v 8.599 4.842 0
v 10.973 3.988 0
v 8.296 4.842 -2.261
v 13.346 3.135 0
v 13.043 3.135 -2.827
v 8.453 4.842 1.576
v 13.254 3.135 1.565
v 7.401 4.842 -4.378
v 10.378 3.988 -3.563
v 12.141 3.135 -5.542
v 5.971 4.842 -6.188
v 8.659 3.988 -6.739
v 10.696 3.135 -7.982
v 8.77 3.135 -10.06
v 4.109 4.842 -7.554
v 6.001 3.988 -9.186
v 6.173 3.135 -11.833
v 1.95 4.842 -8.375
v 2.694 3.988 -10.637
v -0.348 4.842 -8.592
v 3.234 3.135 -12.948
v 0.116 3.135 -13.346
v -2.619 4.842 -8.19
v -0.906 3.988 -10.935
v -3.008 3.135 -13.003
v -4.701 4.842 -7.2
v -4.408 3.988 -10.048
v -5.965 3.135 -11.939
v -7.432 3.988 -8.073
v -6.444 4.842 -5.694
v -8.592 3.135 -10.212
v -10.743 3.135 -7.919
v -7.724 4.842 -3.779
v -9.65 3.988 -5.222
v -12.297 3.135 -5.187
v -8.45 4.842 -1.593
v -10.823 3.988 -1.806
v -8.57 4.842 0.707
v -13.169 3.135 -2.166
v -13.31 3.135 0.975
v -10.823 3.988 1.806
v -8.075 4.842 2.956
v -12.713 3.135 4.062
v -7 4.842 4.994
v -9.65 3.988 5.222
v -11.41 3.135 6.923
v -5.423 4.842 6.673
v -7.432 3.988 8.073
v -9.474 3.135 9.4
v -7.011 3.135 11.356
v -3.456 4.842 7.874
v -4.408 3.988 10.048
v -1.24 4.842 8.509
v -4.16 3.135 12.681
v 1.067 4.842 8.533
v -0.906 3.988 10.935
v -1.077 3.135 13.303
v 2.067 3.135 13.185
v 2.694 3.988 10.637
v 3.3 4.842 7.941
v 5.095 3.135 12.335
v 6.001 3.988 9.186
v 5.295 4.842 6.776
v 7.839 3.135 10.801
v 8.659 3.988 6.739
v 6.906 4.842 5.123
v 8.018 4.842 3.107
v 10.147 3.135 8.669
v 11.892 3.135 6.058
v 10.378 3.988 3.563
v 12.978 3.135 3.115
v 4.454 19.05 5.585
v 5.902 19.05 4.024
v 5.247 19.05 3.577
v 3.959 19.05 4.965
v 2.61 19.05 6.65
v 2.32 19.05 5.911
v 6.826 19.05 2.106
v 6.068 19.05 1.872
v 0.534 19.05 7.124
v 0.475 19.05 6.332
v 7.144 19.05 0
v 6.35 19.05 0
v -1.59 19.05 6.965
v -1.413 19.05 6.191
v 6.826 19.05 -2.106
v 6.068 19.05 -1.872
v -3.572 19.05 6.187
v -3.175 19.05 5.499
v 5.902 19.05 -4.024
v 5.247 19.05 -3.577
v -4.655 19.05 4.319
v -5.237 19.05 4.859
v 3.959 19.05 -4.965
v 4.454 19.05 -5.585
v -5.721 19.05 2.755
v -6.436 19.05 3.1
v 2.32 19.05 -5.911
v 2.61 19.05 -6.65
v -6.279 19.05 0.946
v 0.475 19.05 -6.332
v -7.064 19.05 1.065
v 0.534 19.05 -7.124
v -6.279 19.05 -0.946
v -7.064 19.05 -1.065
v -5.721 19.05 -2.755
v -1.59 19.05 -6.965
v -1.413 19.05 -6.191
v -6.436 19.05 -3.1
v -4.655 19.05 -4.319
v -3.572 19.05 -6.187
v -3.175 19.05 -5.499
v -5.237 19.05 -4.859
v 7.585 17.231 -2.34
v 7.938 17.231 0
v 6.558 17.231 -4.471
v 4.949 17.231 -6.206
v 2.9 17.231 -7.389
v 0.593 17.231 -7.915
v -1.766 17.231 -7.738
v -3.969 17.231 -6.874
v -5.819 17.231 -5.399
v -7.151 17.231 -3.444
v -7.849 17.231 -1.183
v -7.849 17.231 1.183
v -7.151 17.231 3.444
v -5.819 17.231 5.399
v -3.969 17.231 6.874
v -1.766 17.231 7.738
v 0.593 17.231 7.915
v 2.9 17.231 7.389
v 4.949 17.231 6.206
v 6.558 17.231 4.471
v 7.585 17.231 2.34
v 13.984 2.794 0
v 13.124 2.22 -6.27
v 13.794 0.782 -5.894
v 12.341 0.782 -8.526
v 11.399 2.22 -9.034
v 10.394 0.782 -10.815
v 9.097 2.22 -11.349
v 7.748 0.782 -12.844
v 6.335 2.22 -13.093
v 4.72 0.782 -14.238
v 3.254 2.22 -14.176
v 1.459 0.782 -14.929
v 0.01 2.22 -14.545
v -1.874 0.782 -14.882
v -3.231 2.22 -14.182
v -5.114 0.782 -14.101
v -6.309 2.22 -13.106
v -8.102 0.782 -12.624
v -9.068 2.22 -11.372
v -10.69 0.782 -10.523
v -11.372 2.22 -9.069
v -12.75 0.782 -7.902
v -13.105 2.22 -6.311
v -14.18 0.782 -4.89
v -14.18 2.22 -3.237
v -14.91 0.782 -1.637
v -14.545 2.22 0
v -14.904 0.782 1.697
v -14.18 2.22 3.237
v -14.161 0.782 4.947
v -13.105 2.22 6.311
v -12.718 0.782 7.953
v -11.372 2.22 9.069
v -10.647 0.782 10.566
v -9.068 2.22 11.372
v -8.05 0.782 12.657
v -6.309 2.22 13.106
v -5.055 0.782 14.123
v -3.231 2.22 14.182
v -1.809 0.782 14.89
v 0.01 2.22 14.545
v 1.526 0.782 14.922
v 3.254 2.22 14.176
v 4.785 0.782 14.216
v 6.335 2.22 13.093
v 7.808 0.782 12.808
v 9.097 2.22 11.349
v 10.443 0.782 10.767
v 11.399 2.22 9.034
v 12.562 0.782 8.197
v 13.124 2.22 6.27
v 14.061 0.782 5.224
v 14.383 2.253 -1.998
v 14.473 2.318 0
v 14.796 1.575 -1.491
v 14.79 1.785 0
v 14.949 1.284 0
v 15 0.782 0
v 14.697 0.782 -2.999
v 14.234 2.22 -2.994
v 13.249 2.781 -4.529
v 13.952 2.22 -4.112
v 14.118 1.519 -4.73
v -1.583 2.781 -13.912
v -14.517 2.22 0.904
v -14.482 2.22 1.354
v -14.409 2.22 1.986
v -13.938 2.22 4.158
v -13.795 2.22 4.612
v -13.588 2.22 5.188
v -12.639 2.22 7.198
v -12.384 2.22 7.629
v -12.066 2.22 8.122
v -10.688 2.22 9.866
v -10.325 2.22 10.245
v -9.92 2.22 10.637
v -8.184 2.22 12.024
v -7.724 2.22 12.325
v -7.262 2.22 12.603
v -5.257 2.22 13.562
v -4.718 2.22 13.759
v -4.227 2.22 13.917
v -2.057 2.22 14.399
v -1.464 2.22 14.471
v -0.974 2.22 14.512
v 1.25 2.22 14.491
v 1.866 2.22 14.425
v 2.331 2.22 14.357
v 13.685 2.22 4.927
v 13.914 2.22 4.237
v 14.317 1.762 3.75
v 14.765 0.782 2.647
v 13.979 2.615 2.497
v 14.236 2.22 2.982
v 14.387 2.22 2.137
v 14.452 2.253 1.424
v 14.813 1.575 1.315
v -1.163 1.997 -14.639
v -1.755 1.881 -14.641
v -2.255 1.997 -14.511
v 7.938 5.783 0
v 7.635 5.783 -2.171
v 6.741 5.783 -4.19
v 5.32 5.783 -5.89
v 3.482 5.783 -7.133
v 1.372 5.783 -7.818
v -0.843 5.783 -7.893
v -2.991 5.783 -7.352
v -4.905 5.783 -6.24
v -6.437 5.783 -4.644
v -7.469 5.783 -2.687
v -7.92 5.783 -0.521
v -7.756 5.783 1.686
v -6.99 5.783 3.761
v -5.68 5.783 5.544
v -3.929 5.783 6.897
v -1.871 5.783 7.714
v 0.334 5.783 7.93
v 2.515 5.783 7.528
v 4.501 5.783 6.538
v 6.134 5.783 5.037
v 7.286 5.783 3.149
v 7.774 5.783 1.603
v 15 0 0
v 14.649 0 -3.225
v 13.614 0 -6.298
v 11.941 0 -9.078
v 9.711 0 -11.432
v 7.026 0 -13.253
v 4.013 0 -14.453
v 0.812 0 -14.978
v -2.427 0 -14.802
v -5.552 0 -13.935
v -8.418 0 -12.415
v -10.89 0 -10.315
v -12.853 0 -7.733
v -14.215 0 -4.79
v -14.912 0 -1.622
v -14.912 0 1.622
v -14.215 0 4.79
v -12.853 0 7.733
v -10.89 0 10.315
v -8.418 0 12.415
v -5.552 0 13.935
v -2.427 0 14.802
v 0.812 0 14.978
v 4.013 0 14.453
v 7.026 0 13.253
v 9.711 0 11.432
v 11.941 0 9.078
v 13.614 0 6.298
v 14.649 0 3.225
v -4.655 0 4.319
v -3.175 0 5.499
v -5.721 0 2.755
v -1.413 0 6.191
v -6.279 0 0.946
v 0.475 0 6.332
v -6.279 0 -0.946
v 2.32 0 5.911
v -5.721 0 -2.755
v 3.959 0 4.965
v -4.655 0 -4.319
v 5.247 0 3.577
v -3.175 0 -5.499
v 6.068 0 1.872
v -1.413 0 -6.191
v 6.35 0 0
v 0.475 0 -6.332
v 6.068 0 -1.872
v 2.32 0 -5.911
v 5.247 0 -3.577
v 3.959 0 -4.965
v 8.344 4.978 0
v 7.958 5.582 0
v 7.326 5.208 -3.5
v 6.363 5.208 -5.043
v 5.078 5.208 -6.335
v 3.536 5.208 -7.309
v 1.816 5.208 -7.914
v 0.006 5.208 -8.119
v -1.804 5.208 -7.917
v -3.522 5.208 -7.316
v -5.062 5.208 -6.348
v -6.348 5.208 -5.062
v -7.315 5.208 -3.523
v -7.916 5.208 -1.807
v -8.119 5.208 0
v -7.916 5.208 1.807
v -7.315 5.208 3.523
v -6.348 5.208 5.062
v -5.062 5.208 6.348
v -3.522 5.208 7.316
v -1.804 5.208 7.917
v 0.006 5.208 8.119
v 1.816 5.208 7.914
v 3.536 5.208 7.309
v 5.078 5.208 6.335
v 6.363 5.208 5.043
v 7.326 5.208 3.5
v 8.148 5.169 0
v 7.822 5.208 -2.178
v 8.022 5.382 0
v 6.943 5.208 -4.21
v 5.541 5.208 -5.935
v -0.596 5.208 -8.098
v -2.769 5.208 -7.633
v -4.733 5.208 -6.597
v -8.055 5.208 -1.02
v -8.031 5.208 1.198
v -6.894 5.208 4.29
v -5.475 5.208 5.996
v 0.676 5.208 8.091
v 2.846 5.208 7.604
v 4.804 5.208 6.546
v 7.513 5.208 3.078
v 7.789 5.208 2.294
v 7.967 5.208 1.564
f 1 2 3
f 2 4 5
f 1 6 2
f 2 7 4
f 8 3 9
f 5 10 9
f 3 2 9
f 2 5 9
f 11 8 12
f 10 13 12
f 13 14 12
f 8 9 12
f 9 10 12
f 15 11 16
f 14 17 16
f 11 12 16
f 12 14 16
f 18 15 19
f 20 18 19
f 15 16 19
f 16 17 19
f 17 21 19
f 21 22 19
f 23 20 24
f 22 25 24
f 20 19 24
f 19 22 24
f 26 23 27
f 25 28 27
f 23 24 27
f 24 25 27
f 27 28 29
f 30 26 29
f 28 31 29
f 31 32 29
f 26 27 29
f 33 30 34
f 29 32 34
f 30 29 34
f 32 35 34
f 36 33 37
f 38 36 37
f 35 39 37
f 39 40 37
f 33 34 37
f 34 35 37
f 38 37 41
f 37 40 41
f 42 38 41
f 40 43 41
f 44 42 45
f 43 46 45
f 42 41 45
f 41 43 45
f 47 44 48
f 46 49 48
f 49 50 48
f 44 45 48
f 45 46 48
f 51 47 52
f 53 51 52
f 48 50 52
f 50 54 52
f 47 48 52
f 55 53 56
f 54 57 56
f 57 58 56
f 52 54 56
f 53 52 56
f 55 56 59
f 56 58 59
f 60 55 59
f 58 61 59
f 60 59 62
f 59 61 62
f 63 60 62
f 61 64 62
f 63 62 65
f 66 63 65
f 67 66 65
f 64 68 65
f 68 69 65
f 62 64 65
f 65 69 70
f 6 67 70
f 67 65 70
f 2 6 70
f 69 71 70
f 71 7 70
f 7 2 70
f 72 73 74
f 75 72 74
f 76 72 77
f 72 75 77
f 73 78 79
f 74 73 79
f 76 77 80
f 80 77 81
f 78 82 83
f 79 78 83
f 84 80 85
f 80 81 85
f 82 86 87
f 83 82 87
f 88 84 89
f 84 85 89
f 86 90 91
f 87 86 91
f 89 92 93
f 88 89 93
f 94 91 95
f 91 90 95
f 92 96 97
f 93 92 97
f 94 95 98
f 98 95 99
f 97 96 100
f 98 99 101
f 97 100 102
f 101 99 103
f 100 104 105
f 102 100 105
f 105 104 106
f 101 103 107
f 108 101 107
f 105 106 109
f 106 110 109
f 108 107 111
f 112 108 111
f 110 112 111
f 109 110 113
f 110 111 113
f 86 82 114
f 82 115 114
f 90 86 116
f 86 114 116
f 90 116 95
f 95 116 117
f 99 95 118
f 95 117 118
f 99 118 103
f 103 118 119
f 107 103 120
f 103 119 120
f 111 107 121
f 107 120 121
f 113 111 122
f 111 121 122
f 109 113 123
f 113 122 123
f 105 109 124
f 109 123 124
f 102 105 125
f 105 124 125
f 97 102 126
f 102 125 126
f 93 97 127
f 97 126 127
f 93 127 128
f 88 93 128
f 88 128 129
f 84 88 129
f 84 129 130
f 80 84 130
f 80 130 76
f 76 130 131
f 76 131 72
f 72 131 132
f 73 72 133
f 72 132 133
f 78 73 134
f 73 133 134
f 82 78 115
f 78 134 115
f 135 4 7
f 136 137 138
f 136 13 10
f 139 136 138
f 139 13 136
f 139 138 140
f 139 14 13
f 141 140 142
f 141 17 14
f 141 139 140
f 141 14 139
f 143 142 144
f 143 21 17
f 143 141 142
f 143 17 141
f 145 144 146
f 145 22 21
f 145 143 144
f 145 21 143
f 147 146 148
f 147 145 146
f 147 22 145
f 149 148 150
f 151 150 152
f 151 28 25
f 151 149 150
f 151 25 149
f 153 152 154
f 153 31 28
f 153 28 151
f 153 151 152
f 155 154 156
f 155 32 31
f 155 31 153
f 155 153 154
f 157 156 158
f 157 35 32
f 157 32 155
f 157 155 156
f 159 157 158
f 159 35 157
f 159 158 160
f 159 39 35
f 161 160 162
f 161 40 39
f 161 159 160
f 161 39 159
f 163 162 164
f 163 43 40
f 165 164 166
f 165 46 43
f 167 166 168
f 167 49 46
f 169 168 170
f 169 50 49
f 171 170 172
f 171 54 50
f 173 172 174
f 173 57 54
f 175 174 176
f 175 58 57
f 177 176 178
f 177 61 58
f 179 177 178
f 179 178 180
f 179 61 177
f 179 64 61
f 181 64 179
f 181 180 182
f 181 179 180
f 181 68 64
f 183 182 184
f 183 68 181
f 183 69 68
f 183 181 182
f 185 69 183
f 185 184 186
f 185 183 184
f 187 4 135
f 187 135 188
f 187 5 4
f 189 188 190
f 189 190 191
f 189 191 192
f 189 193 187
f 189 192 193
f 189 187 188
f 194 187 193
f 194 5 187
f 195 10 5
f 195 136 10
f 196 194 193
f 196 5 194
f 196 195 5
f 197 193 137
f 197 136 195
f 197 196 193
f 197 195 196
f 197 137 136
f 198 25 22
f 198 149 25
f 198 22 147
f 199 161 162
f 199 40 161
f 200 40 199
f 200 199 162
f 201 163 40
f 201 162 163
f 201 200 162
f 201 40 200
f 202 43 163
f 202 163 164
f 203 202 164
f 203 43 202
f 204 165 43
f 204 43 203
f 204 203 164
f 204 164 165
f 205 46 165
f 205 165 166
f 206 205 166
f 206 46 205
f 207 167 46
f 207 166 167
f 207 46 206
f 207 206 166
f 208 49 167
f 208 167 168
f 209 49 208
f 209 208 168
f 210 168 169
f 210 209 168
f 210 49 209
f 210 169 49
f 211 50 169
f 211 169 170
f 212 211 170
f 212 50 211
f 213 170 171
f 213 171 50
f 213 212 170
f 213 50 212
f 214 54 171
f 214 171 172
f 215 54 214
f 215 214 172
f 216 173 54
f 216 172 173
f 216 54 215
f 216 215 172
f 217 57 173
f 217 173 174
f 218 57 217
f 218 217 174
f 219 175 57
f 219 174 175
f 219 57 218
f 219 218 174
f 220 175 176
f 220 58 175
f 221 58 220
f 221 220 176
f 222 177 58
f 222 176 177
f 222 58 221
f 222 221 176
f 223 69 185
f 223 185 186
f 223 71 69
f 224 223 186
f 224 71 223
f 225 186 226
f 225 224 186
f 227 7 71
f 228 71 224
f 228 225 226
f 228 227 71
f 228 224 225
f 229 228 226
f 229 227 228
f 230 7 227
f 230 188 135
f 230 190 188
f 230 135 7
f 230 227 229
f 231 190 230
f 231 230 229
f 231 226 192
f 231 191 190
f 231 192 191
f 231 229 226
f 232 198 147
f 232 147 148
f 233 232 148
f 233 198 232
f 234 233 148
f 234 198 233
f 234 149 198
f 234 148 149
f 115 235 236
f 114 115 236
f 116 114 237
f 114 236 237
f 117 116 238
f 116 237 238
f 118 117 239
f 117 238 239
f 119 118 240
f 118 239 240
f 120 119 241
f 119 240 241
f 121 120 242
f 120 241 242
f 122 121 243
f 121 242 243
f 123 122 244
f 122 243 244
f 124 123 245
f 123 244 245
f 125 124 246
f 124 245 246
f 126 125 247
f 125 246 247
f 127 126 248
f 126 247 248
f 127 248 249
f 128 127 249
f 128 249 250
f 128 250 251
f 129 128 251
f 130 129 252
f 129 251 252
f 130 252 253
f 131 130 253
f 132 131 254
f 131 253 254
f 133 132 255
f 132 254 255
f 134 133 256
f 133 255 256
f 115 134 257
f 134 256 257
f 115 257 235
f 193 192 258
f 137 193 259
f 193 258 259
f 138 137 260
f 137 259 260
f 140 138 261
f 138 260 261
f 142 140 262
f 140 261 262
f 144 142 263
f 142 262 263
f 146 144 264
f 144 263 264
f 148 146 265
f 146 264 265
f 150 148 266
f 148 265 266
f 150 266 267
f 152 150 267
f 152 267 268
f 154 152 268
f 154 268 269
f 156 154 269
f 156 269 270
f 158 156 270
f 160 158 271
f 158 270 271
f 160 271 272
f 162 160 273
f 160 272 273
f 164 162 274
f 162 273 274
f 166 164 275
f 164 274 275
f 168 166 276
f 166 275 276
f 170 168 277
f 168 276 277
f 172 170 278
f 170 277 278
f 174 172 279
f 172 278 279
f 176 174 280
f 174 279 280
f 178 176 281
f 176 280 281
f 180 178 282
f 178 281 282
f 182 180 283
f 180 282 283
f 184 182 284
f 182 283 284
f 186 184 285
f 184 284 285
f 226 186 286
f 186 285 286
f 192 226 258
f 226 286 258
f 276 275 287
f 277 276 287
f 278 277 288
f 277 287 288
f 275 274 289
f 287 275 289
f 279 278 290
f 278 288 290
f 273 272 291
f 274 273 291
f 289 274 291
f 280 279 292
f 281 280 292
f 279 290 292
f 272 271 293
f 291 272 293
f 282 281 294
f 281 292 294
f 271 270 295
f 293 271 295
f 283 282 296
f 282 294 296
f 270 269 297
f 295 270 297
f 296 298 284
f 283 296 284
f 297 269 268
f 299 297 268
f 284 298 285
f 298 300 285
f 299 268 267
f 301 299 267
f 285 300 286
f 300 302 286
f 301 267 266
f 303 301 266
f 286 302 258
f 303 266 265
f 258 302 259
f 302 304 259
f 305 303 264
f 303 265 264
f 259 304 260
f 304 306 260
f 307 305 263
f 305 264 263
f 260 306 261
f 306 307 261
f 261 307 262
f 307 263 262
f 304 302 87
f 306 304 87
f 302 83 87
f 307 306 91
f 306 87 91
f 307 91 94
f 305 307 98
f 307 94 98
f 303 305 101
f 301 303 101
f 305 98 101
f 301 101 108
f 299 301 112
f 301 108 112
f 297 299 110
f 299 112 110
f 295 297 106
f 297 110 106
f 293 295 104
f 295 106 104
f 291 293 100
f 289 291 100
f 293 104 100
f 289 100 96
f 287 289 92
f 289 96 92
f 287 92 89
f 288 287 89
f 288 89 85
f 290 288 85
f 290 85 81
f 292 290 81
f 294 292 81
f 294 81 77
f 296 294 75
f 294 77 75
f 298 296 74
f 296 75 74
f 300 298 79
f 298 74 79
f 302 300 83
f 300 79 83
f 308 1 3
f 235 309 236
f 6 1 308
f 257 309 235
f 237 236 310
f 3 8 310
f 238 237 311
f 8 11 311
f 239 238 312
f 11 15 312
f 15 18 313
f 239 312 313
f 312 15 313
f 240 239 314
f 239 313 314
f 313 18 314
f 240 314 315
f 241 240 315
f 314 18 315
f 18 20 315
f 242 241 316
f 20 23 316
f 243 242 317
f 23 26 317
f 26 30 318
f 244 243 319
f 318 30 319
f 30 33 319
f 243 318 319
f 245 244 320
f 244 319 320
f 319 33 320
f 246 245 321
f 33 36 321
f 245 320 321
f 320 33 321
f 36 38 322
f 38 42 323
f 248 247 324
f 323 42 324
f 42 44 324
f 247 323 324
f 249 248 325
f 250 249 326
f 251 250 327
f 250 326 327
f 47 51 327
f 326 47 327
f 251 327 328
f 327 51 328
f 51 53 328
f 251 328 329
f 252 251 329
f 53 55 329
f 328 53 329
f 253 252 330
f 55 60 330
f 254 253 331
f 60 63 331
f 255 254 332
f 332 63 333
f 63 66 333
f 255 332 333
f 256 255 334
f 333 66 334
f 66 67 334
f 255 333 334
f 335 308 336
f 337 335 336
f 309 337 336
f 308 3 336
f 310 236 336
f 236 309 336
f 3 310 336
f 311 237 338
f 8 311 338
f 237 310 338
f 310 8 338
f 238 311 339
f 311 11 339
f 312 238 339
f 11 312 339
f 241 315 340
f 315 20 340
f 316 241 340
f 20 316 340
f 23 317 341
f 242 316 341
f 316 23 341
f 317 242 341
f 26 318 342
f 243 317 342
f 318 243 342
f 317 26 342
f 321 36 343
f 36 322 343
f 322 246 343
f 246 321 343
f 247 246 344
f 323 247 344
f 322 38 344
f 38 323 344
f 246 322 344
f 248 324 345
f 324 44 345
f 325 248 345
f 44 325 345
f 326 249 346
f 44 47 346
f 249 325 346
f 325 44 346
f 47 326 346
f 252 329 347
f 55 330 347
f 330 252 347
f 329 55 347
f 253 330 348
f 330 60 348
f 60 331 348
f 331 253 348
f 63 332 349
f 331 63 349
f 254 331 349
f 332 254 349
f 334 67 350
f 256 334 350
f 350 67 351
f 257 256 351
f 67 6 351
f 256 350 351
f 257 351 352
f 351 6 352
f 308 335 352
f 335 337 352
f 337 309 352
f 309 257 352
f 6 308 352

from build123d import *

# Parameters (mm, degrees)
FILLET1_R = 2.5
FILLET2_R = 1


with BuildPart() as part:
    # Sketch1 → Revolve1 (revolve)
    with BuildSketch(Plane.XY):
        Polygon((6.35, 19.05), (7.14375, 19.05), (7.9375, 17.231027131), (7.9375, 5.08), (15, 2.54), (15, 0), (6.35, 0), align=None)
    revolve(axis=Axis((0, -0.9525, 0), (0, 1, 0)))

    # Fillet1
    fillet1_edges = [part.edges().sort_by_distance(p)[0] for p in [
        (-15, 2.54, 0),
    ]]
    fillet(fillet1_edges, radius=FILLET1_R)

    # Fillet2
    fillet2_edges = [part.edges().sort_by_distance(p)[0] for p in [
        (-7.9375, 5.08, 0),
    ]]
    fillet(fillet2_edges, radius=FILLET2_R)


solid = part.part
